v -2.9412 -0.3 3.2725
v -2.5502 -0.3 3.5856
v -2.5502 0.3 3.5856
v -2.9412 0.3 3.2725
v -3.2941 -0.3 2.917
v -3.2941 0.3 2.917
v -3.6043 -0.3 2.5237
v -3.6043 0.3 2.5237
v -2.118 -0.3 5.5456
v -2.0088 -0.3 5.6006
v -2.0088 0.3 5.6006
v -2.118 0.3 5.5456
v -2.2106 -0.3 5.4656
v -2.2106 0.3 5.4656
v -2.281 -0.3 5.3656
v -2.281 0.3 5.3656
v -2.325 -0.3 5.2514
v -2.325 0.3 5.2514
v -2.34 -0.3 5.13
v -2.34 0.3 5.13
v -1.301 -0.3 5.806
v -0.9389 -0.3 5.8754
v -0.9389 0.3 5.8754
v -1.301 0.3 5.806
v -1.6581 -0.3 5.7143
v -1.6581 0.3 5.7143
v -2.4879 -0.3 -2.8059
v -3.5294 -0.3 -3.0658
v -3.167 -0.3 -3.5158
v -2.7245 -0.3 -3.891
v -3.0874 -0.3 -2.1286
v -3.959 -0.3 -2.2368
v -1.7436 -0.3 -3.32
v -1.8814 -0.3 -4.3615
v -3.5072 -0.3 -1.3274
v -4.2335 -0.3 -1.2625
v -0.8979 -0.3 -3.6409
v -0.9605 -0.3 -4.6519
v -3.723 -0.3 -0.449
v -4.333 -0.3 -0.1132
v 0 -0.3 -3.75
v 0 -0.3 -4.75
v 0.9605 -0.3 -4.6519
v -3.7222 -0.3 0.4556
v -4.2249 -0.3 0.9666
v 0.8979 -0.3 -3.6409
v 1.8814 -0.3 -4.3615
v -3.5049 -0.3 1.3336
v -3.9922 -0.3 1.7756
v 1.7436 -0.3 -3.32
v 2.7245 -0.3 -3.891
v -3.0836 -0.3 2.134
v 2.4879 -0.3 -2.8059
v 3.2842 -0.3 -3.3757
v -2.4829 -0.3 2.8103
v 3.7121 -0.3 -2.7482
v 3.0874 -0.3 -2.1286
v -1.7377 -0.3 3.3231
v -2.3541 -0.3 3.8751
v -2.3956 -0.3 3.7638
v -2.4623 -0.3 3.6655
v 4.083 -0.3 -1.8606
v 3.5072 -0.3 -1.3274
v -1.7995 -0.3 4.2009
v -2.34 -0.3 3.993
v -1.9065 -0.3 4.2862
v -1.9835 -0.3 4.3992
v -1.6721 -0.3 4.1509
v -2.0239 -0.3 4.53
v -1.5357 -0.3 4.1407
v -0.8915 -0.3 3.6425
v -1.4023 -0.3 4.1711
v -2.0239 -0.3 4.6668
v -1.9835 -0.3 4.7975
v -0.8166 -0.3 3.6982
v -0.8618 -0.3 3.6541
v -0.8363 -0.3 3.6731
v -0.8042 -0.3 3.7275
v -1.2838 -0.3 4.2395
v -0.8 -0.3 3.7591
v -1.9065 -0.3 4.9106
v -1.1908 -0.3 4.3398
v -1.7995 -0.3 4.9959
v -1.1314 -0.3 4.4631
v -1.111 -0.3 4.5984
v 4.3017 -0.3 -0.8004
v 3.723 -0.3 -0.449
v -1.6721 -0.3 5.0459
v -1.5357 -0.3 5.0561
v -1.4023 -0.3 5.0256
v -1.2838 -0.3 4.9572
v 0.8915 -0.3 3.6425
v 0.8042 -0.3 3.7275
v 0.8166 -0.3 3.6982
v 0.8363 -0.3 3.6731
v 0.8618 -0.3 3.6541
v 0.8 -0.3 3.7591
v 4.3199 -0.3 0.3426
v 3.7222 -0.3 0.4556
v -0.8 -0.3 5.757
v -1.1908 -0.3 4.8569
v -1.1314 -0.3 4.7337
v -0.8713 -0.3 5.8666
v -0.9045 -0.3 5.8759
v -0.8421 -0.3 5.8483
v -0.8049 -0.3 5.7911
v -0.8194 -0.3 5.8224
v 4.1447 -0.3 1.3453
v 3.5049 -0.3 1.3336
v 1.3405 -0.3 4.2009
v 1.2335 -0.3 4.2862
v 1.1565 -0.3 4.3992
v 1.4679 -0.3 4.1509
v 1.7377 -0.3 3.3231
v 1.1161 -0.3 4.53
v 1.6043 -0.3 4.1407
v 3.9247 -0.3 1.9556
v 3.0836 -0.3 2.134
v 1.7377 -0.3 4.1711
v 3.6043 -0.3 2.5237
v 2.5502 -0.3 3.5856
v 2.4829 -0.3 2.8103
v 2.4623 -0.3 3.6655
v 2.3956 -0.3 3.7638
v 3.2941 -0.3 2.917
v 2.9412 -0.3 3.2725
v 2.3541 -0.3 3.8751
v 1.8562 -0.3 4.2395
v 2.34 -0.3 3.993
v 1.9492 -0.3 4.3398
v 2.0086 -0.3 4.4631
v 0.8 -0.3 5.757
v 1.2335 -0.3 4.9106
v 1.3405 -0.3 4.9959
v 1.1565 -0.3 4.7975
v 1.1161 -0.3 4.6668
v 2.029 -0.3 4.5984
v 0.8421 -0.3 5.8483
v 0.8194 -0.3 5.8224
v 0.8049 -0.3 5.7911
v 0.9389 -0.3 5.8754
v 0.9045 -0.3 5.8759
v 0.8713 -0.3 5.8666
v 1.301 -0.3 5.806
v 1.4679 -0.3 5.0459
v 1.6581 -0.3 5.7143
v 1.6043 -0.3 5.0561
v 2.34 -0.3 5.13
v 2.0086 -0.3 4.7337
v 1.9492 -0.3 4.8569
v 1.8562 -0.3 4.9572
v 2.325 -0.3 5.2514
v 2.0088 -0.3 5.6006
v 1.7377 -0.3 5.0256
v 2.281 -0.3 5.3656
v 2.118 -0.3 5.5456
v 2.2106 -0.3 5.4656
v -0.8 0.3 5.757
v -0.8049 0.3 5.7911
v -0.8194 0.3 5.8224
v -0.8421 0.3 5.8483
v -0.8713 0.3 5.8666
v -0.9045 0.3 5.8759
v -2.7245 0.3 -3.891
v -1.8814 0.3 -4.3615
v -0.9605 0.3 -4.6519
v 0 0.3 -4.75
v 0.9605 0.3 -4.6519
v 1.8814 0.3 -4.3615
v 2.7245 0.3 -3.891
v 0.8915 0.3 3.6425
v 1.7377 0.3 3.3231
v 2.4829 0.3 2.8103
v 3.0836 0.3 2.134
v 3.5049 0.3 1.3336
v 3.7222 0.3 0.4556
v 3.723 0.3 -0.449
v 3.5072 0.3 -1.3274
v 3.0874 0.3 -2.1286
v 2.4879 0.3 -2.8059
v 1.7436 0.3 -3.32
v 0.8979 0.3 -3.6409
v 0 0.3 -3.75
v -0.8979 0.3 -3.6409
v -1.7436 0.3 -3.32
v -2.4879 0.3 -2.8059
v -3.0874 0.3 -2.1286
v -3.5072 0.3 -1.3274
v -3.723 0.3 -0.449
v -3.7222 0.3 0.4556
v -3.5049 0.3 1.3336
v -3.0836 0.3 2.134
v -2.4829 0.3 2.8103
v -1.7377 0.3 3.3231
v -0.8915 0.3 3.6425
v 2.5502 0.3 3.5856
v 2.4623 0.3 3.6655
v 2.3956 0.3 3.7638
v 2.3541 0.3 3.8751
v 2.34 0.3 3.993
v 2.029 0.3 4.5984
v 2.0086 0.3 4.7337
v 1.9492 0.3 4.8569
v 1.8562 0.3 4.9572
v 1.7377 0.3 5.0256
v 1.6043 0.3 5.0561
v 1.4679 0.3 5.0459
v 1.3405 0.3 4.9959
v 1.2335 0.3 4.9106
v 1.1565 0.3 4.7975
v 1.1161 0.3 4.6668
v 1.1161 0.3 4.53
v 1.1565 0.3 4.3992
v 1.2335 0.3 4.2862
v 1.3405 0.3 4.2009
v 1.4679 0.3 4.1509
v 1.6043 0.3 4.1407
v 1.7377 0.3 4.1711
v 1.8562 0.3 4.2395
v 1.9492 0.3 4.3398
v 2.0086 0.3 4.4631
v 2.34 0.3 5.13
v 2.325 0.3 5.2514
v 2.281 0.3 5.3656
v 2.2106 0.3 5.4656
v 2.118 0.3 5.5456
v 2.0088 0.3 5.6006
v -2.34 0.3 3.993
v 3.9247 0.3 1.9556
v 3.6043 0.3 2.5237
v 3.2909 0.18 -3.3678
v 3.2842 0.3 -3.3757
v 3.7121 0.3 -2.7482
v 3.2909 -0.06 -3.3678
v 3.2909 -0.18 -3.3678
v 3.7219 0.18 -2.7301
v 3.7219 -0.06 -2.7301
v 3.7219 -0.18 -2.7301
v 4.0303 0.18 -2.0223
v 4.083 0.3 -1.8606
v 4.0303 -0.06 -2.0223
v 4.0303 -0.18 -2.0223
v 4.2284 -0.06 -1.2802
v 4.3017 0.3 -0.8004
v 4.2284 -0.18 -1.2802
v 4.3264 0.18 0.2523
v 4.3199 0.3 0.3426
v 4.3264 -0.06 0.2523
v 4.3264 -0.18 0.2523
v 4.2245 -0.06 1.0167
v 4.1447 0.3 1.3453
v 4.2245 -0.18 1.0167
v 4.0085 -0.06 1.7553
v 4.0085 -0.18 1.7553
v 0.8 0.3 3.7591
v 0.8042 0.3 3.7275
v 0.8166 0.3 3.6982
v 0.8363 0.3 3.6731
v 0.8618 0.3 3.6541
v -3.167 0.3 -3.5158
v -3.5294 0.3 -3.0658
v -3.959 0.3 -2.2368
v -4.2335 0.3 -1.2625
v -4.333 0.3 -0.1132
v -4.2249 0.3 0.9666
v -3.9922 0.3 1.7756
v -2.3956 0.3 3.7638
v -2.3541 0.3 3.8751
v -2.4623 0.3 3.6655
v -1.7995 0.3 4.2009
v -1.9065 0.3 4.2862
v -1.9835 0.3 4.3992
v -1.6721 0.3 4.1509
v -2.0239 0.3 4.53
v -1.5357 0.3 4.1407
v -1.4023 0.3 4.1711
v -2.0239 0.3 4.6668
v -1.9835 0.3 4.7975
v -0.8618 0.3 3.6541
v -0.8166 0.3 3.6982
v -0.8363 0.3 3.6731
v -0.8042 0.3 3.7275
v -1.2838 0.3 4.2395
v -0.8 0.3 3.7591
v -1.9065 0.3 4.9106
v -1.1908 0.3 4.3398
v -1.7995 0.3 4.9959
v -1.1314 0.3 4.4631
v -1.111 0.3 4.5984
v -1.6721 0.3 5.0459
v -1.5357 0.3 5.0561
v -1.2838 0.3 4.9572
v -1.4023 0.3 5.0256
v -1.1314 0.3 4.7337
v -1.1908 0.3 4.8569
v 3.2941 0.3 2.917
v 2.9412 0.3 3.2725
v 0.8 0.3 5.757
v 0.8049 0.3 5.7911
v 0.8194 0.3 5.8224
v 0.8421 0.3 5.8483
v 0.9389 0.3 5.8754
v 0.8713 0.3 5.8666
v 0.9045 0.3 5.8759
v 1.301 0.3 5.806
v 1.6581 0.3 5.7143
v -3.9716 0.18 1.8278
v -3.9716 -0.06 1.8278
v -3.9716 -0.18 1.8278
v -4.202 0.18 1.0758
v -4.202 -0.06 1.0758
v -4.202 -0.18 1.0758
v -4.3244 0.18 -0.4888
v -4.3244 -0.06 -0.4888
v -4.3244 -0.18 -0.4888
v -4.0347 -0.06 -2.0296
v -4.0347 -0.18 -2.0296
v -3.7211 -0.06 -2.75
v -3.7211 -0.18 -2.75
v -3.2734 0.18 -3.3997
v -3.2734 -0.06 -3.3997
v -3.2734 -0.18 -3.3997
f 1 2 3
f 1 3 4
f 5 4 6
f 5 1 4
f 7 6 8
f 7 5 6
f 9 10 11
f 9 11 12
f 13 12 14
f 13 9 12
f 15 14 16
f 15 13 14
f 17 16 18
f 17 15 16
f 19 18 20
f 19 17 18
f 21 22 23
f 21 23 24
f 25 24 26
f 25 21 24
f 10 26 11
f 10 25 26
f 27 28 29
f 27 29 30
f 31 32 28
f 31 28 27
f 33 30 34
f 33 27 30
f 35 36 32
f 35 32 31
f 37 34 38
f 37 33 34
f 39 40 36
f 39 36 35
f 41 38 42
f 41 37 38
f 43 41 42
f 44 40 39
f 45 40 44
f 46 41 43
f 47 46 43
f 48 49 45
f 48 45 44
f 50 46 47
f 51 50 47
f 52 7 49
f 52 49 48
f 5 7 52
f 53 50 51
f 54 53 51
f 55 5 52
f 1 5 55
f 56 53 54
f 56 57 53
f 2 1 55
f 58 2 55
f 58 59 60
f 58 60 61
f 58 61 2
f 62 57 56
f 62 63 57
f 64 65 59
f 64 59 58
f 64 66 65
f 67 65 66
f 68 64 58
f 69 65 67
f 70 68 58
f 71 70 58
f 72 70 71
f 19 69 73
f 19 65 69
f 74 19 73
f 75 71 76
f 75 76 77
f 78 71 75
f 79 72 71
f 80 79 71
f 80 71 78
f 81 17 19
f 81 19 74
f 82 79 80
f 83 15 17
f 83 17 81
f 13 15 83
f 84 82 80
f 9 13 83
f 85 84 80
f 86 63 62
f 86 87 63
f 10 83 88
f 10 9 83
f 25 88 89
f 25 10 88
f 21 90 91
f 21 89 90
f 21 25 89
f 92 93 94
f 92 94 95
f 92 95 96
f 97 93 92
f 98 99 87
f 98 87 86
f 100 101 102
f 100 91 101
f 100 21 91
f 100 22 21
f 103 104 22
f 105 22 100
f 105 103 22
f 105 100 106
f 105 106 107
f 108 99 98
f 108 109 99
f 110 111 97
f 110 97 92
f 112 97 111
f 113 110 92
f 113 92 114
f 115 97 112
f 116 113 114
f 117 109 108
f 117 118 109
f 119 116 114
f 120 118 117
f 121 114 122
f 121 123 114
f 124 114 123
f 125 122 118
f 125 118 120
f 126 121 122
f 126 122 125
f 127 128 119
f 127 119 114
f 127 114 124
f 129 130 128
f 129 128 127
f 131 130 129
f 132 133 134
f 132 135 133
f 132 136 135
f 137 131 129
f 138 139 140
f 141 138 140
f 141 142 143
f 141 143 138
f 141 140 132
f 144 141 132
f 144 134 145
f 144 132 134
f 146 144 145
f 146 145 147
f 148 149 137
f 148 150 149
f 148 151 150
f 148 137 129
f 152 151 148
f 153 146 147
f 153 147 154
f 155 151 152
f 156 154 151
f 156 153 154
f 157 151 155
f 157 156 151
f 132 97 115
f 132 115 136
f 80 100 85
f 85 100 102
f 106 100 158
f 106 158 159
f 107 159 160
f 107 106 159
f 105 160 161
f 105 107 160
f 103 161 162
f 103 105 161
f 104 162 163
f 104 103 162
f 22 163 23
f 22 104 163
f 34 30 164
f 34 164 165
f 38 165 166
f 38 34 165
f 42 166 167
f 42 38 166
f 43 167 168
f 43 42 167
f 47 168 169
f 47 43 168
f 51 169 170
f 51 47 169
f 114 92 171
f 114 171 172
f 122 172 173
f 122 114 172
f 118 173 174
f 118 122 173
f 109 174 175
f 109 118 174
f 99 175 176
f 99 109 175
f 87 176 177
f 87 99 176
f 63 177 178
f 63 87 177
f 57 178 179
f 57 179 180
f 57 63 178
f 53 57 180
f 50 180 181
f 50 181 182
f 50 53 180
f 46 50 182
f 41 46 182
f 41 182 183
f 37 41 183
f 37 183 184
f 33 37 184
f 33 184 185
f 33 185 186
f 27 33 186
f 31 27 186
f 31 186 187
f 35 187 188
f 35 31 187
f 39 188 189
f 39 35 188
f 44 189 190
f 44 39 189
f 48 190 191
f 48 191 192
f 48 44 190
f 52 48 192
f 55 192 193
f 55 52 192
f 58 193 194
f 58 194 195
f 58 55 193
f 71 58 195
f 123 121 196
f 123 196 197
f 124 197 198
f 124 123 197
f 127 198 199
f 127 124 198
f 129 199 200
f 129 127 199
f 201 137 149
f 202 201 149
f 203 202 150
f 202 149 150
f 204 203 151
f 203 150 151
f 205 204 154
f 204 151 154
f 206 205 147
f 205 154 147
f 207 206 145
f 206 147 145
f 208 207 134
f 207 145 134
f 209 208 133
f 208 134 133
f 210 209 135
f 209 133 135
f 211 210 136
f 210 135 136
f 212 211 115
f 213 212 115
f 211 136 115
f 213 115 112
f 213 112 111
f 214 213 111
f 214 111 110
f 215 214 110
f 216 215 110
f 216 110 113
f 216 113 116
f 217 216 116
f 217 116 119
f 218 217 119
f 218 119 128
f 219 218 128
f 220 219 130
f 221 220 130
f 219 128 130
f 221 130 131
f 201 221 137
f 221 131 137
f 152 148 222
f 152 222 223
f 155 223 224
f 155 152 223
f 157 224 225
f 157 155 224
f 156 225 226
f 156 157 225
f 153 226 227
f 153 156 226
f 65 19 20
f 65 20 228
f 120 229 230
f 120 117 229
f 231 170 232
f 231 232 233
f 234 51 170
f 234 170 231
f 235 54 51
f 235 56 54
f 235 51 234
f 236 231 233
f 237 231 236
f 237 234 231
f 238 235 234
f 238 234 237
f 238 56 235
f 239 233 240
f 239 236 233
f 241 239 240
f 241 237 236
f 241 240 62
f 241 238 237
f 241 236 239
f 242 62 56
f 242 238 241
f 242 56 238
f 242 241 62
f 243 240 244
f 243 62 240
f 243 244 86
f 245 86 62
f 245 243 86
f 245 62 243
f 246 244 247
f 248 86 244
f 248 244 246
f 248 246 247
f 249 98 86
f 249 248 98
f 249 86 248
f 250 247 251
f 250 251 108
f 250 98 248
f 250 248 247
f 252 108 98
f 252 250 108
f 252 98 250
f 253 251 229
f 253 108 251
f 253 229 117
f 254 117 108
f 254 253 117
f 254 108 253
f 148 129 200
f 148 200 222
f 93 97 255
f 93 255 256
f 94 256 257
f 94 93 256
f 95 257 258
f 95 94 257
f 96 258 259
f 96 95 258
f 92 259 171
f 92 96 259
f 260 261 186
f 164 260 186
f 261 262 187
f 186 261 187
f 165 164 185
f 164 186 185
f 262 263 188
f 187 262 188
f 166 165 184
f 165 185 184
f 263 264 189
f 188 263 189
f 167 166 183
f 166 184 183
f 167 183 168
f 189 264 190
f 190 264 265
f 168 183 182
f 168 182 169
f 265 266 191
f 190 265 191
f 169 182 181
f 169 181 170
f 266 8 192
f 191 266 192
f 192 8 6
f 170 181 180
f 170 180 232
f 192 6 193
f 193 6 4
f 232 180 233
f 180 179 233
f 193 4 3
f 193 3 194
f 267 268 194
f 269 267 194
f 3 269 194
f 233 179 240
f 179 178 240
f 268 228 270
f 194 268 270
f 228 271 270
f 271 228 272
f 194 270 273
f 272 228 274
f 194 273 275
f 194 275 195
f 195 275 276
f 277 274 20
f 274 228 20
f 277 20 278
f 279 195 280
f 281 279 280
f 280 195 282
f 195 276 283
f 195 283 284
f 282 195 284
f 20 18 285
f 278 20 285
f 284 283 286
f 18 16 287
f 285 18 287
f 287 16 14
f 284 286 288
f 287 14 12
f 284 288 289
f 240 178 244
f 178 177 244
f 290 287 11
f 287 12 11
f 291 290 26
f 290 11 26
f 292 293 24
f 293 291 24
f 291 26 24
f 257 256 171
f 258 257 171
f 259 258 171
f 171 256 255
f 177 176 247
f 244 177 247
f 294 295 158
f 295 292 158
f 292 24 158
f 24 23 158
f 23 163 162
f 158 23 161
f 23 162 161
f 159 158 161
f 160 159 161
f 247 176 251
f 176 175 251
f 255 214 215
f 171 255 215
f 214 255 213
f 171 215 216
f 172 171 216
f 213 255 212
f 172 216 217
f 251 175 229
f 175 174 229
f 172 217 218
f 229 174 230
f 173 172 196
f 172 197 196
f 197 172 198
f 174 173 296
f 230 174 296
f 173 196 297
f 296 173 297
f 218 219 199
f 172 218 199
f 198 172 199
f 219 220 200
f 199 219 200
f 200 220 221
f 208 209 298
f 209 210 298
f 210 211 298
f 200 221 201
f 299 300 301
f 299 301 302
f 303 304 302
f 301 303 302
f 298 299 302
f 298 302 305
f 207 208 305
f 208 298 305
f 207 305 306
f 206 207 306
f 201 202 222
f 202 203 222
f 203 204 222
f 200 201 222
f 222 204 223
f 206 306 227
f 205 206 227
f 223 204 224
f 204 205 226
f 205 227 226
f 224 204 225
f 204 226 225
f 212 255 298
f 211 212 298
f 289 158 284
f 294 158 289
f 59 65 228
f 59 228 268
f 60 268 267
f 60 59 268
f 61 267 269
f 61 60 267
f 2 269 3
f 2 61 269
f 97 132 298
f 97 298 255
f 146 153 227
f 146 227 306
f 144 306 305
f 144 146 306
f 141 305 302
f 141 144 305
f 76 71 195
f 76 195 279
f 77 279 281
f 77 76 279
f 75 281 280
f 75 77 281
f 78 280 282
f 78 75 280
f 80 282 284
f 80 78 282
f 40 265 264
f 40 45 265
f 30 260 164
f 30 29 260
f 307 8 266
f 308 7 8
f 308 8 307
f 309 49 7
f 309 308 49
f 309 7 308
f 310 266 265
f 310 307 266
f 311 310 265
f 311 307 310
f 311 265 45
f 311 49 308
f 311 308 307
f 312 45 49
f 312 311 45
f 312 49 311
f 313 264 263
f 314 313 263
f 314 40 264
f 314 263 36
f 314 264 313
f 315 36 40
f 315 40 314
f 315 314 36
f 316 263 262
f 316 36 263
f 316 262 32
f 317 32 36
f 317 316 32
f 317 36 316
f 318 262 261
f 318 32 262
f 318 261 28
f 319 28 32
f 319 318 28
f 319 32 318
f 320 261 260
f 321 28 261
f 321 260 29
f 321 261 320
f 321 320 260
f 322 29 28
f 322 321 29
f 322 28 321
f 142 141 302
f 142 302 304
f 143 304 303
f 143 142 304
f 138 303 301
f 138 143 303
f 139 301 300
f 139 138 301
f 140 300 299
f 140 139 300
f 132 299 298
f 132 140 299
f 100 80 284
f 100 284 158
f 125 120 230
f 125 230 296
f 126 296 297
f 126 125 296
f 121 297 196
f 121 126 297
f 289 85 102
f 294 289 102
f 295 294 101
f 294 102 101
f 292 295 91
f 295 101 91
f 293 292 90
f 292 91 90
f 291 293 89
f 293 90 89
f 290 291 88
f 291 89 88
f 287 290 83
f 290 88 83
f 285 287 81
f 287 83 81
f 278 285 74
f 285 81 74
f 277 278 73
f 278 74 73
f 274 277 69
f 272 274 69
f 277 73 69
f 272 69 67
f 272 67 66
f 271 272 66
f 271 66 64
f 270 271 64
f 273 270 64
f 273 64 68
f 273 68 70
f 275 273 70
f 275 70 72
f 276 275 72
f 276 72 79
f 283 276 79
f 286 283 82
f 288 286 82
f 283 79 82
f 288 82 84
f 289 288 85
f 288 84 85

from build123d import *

# Parameters (mm, degrees)
SCHIZZO1_R                   = 0.458996056
ESTRUSIONE_ESTRUSIONE1_DEPTH = 0.6


with BuildPart() as part:
    # Schizzo1 → Estrusione-Estrusione1 (new body)
    with BuildSketch(Plane.XZ.offset(0.3)):
        with BuildLine():
            Line((-2.34, 5.13), (-2.34, 3.993043952))
            ThreePointArc((-2.34, 3.993043952), (-2.395647685, 3.763803858), (-2.550204082, 3.585590487))
            ThreePointArc((-2.550204082, 3.585590487), (-3.12270208, 3.099795432), (-3.604268995, 2.52373632))
            add(Edge.make_bspline(
                [(-3.604268995, 2.52373632), (-3.853924568, 2.156927576), (-4.029511845, 1.735833882), (-4.145169154, 1.307464944), (-4.308172181, 0.703737997), (-4.360675474, 0.06363484), (-4.320124497, -0.560393871), (-4.278553695, -1.200116418), (-4.137438556, -1.845937547), (-3.877676401, -2.432023456), (-3.723583884, -2.779693241), (-3.52331205, -3.113059535), (-3.273444303, -3.39973861), (-3.112104376, -3.58484766), (-2.9274837, -3.75281032), (-2.724488073, -3.89097221)],
                knots=[0, 0, 0, 0, 0.001331123, 0.001331123, 0.001331123, 0.003211952, 0.003211952, 0.003211952, 0.005142922, 0.005142922, 0.005142922, 0.006280106, 0.006280106, 0.006280106, 0.007010759, 0.007010759, 0.007010759, 0.007010759], degree=3))
            ThreePointArc((-2.724488073, -3.89097221), (0, -4.75), (2.724488073, -3.89097221))
            add(Edge.make_bspline(
                [(2.724488073, -3.89097221), (3.02256608, -3.682255743), (3.280103619, -3.409405395), (3.48806342, -3.110798992), (3.7651858, -2.712883068), (3.966732048, -2.257894847), (4.103489225, -1.792672996), (4.28909221, -1.161287017), (4.363995711, -0.488820559), (4.33114693, 0.168459959), (4.304204363, 0.707561374), (4.203554262, 1.252009555), (4.008527428, 1.755319372), (3.903955576, 2.02519013), (3.770275035, 2.286655125), (3.604268995, 2.52373632)],
                knots=[0, 0, 0, 0, 0.001091658, 0.001091658, 0.001091658, 0.002547666, 0.002547666, 0.002547666, 0.004529951, 0.004529951, 0.004529951, 0.006151973, 0.006151973, 0.006151973, 0.007014946, 0.007014946, 0.007014946, 0.007014946], degree=3))
            ThreePointArc((3.604268995, 2.52373632), (3.12270208, 3.099795432), (2.550204082, 3.585590487))
            ThreePointArc((2.550204082, 3.585590487), (2.395647685, 3.763803858), (2.34, 3.993043952))
            Line((2.34, 3.993043952), (2.34, 5.13))
            ThreePointArc((2.34, 5.13), (2.24890321, 5.417746703), (2.008807339, 5.600642202))
            ThreePointArc((2.008807339, 5.600642202), (1.480262865, 5.762926501), (0.938936535, 5.875448764))
            ThreePointArc((0.938936535, 5.875448764), (0.842129544, 5.848255068), (0.8, 5.756952319))
            Line((0.8, 5.756952319), (0.8, 3.759055732))
            ThreePointArc((0.8, 3.759055732), (0.825598581, 3.684972184), (0.891472868, 3.642495865))
            ThreePointArc((0.891472868, 3.642495865), (0, -3.75), (-0.891472868, 3.642495865))
            ThreePointArc((-0.891472868, 3.642495865), (-0.825598581, 3.684972184), (-0.8, 3.759055732))
            Line((-0.8, 3.759055732), (-0.8, 5.756952319))
            ThreePointArc((-0.8, 5.756952319), (-0.842129544, 5.848255068), (-0.938936535, 5.875448764))
            ThreePointArc((-0.938936535, 5.875448764), (-1.480262865, 5.762926501), (-2.008807339, 5.600642202))
            ThreePointArc((-2.008807339, 5.600642202), (-2.24890321, 5.417746703), (-2.34, 5.13))
        make_face()
        with Locations((1.57, 4.598363042)):
            Circle(SCHIZZO1_R, mode=Mode.SUBTRACT)
        with Locations((-1.57, 4.598363042)):
            Circle(SCHIZZO1_R, mode=Mode.SUBTRACT)
    extrude(amount=-ESTRUSIONE_ESTRUSIONE1_DEPTH)


solid = part.part
